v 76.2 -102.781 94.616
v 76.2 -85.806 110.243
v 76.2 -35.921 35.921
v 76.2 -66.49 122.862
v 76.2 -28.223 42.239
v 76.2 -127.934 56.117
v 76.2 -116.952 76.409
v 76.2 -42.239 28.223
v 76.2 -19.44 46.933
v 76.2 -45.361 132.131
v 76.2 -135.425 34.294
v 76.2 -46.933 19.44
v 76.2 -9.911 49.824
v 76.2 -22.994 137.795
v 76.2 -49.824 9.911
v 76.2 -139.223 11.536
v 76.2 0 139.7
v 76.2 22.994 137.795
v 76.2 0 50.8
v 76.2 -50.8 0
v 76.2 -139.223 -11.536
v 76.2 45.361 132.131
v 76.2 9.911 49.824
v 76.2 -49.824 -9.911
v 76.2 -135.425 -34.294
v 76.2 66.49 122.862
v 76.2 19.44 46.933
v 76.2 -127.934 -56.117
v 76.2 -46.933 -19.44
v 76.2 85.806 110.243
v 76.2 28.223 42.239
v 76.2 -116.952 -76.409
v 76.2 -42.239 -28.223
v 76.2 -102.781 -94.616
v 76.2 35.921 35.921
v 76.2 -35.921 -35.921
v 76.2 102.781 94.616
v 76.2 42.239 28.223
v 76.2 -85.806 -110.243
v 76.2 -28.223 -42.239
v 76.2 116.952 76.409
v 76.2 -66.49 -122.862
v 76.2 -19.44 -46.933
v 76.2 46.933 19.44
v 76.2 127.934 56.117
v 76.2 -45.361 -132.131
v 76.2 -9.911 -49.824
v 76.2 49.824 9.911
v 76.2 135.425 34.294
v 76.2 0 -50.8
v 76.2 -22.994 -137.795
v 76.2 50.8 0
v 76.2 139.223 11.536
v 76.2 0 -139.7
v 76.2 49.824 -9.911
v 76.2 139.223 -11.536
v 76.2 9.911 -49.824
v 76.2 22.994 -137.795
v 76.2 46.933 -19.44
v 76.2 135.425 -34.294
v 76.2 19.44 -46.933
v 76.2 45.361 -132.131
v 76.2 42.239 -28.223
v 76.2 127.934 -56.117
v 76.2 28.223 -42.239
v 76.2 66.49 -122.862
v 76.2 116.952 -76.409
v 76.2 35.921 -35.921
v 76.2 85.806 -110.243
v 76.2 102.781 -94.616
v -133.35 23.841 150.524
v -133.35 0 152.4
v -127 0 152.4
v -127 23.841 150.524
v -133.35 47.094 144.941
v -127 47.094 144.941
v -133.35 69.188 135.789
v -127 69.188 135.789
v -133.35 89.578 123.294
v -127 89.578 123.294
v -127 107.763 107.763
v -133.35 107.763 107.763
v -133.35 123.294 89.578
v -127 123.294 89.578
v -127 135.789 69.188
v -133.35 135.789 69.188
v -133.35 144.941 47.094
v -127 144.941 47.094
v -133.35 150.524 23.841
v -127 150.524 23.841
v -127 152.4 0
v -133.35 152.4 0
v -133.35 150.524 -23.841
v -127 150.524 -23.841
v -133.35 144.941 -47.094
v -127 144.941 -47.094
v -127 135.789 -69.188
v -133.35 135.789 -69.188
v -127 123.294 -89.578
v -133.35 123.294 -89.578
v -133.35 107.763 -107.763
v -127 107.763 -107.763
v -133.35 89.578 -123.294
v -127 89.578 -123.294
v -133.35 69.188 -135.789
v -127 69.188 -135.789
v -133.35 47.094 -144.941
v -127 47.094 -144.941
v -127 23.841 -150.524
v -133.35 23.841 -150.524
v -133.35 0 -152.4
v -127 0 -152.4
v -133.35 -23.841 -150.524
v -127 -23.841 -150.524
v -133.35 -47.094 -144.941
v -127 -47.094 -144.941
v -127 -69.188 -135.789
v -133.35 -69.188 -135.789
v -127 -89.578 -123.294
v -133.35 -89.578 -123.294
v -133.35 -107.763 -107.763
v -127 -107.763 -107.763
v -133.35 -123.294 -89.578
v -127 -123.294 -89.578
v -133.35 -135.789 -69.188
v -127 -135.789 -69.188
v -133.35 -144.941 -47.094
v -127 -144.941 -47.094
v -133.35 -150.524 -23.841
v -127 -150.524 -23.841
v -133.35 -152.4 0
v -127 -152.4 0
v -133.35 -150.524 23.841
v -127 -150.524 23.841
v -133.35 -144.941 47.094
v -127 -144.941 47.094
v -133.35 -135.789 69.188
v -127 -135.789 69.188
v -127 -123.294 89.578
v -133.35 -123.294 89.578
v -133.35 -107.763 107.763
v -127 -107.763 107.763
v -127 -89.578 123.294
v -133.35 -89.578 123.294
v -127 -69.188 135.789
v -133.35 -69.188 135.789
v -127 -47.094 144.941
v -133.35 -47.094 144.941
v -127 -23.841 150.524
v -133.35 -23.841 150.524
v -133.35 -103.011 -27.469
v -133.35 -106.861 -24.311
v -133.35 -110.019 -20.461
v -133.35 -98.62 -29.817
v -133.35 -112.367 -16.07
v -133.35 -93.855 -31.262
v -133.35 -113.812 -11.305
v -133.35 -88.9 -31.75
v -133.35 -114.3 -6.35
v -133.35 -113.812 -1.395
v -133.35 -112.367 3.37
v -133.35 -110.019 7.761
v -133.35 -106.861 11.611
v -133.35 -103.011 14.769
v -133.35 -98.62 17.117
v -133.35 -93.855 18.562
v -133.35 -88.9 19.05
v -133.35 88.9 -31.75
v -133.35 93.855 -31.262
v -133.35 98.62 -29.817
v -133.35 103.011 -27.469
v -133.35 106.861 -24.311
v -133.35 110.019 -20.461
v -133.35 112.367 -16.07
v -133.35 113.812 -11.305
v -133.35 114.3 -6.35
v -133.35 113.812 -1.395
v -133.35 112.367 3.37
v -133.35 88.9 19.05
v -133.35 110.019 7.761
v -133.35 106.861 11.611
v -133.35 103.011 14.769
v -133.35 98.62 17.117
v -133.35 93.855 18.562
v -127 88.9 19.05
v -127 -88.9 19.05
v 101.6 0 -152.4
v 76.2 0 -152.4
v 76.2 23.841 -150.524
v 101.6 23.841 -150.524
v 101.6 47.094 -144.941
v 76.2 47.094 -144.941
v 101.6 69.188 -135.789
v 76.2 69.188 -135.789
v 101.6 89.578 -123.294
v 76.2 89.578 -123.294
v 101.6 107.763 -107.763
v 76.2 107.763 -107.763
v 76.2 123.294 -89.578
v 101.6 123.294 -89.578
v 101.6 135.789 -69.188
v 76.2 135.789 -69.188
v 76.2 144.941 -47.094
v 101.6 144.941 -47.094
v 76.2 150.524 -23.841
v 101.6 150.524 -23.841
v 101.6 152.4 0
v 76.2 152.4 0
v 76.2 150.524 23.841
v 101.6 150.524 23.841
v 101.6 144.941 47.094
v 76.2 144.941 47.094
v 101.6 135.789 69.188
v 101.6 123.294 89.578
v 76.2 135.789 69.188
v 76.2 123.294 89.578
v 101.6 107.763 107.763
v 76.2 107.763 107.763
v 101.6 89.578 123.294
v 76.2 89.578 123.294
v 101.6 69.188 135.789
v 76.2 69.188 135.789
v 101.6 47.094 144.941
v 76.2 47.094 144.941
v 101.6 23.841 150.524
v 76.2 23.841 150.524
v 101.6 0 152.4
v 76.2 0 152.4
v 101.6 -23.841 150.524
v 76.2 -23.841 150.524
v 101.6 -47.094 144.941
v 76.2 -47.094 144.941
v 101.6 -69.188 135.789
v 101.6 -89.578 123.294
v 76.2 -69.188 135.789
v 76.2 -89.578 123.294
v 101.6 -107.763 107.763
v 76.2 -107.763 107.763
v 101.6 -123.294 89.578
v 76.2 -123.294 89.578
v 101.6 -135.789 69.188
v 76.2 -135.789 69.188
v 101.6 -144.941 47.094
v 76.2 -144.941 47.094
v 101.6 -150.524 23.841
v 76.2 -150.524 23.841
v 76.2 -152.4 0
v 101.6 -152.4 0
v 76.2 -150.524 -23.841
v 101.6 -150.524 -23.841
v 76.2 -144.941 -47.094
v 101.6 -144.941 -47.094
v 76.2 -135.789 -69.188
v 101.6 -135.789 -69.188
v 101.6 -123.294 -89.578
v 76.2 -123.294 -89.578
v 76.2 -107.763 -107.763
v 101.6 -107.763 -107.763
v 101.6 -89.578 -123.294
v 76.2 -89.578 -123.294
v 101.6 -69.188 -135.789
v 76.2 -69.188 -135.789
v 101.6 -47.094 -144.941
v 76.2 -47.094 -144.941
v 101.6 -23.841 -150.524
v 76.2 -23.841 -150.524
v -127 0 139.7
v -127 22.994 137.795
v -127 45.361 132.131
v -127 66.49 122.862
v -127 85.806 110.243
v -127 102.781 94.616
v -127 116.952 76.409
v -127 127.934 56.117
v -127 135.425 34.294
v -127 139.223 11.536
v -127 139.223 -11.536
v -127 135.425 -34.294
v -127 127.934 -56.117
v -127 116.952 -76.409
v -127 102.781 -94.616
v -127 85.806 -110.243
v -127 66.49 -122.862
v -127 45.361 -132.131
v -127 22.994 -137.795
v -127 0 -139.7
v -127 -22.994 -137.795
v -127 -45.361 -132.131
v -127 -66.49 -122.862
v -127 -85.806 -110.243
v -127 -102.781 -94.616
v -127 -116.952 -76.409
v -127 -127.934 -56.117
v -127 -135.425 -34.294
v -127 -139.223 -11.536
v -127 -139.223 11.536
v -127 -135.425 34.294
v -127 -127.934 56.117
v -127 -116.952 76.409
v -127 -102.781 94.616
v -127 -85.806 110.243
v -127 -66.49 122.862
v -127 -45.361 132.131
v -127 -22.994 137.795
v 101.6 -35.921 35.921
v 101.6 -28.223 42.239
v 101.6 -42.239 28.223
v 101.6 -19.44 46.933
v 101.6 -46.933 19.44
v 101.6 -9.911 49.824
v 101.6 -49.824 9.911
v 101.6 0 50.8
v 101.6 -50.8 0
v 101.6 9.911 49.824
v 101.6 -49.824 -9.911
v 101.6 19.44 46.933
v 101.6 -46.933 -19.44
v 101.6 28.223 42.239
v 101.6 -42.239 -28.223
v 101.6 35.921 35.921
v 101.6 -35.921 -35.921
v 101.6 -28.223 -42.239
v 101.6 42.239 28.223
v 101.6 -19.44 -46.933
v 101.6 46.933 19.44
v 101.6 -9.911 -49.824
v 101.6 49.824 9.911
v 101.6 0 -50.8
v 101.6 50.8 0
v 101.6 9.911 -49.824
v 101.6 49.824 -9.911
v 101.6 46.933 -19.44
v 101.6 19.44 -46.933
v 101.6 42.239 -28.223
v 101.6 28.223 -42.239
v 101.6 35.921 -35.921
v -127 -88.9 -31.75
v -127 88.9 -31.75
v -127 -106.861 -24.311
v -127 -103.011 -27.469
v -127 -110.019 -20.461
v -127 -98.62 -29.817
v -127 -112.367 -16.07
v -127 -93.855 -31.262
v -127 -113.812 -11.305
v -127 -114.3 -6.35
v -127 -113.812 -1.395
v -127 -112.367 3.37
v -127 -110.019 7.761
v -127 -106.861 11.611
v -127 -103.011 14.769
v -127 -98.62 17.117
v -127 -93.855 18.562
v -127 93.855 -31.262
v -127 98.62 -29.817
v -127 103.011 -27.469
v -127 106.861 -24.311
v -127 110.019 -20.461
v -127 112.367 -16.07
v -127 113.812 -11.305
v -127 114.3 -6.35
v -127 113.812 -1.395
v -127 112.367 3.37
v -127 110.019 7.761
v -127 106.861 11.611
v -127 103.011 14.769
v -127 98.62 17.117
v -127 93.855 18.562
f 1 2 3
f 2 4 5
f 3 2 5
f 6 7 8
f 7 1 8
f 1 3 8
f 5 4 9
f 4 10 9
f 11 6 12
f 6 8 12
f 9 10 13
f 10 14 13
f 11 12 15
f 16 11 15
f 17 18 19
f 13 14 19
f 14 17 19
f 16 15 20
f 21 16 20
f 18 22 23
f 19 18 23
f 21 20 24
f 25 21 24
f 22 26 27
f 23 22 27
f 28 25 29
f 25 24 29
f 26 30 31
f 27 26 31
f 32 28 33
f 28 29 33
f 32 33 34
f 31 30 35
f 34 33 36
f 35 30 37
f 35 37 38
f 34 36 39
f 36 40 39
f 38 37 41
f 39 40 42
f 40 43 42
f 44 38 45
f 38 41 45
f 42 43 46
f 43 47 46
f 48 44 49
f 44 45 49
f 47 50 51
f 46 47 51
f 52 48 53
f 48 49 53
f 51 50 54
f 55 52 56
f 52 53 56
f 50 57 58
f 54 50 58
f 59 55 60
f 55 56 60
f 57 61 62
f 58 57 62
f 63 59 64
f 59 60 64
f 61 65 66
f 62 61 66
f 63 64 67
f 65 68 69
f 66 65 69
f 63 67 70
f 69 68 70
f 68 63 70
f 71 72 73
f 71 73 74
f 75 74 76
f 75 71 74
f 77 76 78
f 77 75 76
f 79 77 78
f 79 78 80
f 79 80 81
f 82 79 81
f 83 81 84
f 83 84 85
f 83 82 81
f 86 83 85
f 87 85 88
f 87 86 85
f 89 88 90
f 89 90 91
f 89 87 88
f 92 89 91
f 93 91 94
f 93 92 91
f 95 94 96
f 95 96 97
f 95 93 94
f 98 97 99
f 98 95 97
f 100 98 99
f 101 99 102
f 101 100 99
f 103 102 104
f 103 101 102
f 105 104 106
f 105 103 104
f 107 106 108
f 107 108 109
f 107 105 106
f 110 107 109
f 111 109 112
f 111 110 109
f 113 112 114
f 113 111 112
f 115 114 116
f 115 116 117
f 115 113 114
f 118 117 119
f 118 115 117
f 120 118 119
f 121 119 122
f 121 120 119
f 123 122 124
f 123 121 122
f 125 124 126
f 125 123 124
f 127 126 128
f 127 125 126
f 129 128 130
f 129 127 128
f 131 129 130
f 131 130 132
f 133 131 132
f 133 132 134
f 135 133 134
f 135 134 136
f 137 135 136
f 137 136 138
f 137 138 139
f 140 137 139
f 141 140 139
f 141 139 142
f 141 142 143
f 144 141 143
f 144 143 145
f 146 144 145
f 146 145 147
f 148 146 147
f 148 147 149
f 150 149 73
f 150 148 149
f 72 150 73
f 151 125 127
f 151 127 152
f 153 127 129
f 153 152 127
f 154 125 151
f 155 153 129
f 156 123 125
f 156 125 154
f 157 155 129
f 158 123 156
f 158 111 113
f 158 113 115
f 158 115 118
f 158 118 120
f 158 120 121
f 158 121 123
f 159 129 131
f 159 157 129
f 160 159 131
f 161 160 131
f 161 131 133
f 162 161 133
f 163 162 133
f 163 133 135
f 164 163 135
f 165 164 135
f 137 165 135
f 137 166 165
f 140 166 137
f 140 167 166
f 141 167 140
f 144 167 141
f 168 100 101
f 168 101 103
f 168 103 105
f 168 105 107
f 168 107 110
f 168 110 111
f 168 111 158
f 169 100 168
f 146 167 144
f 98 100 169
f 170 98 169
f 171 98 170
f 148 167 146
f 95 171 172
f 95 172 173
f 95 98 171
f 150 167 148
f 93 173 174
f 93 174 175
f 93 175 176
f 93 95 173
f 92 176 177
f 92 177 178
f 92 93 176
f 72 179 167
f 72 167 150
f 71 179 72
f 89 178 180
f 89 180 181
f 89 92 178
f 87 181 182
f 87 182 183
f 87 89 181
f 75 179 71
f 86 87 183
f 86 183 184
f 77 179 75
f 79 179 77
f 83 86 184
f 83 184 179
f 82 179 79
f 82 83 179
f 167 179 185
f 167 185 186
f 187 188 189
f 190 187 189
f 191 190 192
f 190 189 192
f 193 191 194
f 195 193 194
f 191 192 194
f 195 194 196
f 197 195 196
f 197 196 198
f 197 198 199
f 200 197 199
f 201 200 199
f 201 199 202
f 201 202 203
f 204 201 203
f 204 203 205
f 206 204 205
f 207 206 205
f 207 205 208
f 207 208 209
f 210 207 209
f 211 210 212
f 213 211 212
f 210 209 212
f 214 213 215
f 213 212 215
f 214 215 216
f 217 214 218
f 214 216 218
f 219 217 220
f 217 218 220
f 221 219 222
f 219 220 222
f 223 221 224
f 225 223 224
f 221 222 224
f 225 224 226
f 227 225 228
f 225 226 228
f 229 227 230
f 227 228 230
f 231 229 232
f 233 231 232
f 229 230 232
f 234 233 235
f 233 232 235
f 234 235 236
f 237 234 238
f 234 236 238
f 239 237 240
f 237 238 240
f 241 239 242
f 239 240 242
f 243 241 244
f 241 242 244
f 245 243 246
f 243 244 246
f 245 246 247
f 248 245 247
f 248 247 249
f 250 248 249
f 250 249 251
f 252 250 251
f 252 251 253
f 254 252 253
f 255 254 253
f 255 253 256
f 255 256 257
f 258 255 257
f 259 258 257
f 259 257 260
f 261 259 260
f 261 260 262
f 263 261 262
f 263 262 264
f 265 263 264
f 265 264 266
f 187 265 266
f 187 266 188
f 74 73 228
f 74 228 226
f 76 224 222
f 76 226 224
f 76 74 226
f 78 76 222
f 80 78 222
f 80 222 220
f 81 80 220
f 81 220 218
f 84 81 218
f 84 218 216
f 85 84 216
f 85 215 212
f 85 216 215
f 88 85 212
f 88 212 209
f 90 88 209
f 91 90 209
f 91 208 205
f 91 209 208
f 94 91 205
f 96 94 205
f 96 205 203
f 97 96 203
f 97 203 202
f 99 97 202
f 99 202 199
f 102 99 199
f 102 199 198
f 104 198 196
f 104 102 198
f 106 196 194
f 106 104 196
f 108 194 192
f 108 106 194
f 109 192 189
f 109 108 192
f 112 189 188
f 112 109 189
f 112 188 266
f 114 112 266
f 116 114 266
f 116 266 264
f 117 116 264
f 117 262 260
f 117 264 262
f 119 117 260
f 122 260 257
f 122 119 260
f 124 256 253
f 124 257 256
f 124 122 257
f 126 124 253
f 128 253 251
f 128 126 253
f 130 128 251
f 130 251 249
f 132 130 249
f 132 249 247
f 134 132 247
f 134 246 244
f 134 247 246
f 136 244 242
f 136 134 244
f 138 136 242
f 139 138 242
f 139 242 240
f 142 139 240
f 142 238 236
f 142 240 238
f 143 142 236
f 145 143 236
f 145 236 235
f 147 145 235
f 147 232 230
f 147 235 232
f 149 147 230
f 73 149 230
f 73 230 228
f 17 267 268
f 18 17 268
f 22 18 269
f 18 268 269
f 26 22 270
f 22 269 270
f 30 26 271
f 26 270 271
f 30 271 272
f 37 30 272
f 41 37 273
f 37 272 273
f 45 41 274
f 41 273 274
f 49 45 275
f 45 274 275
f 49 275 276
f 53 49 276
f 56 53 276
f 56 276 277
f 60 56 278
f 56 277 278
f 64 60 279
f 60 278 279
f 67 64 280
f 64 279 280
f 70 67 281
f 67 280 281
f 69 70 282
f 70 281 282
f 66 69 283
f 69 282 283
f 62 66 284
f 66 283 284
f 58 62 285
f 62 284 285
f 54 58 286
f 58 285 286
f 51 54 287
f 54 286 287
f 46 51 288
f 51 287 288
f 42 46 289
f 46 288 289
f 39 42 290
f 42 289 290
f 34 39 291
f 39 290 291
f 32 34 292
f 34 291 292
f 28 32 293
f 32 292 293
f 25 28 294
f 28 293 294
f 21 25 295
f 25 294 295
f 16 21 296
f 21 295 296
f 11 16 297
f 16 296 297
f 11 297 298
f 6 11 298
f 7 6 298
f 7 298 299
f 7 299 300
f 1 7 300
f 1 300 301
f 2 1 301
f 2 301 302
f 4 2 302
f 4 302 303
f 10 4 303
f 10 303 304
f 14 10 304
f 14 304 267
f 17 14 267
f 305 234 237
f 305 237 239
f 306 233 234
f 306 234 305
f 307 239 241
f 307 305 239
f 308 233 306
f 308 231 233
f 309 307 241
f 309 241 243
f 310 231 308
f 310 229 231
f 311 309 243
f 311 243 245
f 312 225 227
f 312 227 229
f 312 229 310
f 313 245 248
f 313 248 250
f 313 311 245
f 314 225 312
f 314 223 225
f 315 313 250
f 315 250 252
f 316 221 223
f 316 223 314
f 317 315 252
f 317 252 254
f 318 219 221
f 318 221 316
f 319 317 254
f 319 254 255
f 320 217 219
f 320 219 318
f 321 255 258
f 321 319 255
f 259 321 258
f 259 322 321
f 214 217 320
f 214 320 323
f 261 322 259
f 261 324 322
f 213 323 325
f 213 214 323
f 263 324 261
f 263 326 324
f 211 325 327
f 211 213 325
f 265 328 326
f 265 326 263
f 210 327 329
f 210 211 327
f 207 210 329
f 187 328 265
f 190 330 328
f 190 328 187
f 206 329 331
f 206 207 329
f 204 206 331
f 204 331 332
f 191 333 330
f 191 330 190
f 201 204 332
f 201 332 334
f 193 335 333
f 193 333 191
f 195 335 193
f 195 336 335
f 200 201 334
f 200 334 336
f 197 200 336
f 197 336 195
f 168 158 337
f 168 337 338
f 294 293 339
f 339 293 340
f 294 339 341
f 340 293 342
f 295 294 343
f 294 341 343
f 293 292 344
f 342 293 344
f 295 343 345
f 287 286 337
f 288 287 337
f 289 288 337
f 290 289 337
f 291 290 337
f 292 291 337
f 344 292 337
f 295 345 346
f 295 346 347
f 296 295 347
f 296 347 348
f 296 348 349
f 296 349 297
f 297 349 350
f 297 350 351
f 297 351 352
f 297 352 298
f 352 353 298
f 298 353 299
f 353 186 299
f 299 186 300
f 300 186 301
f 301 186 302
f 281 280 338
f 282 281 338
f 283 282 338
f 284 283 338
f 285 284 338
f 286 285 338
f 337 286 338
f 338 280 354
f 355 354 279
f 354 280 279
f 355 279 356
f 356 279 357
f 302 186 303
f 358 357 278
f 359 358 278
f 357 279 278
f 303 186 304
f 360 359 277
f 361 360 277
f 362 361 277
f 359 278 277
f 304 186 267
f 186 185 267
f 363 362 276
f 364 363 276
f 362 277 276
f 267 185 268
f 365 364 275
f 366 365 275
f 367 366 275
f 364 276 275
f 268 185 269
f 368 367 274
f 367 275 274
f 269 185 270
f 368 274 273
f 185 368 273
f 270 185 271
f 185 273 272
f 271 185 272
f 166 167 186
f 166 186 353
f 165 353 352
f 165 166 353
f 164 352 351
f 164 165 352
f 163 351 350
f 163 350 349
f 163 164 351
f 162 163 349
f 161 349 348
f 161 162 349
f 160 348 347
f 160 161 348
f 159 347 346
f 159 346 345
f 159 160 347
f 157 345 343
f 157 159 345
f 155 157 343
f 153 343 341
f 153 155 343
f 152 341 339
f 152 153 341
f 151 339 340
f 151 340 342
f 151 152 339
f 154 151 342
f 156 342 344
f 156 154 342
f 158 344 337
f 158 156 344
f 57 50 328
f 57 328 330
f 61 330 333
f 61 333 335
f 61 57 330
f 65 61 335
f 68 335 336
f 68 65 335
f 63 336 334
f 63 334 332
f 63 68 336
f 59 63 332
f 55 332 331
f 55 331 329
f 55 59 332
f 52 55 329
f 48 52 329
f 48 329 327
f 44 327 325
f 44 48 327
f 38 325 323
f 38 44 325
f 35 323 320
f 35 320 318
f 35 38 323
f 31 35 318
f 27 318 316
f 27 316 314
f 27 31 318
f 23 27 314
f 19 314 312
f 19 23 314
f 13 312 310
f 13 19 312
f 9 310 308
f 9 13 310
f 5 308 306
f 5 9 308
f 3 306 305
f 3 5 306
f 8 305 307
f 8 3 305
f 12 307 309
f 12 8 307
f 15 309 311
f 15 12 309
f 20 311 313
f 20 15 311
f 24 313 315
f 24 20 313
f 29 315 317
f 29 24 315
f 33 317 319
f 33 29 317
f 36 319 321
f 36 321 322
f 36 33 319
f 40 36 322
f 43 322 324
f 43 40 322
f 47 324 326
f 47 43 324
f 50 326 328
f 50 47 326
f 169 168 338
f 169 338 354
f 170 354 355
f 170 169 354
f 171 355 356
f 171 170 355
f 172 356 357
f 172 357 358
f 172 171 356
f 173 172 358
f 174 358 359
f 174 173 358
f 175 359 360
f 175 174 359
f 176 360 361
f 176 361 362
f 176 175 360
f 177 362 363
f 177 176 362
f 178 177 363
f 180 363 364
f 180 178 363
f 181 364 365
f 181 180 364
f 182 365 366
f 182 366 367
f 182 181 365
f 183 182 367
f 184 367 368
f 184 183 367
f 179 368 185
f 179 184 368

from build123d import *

# Parameters (mm, degrees)
BOSS_EXTRUDE1_START = 76.2
SKETCH2_R           = 152.4
SKETCH2_R_2         = 50.8
BOSS_EXTRUDE1_DEPTH = 25.4
BOSS_EXTRUDE2_START = 203.2
SKETCH3_R           = 152.4
SKETCH3_R_2         = 139.7
BOSS_EXTRUDE2_DEPTH = 203.2
BOSS_EXTRUDE3_START = 6.35
SKETCH4_R           = 152.4
BOSS_EXTRUDE3_DEPTH = 6.35
CUT_EXTRUDE1_START  = -120.65
CUT_EXTRUDE1_DEPTH  = 6.35


with BuildPart() as part:
    # Sketch2 → Boss-Extrude1 (new body)
    with BuildSketch(Plane(origin=(0, 0, 0), x_dir=(0, 0, -1), z_dir=(1, 0, 0)).offset(BOSS_EXTRUDE1_START)):
        Circle(SKETCH2_R)
        Circle(SKETCH2_R_2, mode=Mode.SUBTRACT)
    extrude(amount=BOSS_EXTRUDE1_DEPTH)

    # Sketch3 → Boss-Extrude2 (add)
    with BuildSketch(Plane.ZY.offset(-76.2).offset(BOSS_EXTRUDE2_START)):
        Circle(SKETCH3_R)
        Circle(SKETCH3_R_2, mode=Mode.SUBTRACT)
    extrude(amount=-BOSS_EXTRUDE2_DEPTH)

    # Sketch4 → Boss-Extrude3 (add)
    with BuildSketch(Plane.ZY.offset(127).offset(BOSS_EXTRUDE3_START)):
        Circle(SKETCH4_R)
    extrude(amount=-BOSS_EXTRUDE3_DEPTH)

    # Sketch5 → Cut-Extrude1 (cut)
    with BuildSketch(Plane.ZY.offset(254).offset(CUT_EXTRUDE1_START)):
        with BuildLine():
            Line((19.05, 88.9), (19.05, -88.9))
            ThreePointArc((19.05, -88.9), (-6.35, -114.3), (-31.75, -88.9))
            Line((-31.75, -88.9), (-31.75, 88.9))
            ThreePointArc((-31.75, 88.9), (-6.35, 114.3), (19.05, 88.9))
        make_face()
    extrude(amount=-CUT_EXTRUDE1_DEPTH, mode=Mode.SUBTRACT)


solid = part.part
